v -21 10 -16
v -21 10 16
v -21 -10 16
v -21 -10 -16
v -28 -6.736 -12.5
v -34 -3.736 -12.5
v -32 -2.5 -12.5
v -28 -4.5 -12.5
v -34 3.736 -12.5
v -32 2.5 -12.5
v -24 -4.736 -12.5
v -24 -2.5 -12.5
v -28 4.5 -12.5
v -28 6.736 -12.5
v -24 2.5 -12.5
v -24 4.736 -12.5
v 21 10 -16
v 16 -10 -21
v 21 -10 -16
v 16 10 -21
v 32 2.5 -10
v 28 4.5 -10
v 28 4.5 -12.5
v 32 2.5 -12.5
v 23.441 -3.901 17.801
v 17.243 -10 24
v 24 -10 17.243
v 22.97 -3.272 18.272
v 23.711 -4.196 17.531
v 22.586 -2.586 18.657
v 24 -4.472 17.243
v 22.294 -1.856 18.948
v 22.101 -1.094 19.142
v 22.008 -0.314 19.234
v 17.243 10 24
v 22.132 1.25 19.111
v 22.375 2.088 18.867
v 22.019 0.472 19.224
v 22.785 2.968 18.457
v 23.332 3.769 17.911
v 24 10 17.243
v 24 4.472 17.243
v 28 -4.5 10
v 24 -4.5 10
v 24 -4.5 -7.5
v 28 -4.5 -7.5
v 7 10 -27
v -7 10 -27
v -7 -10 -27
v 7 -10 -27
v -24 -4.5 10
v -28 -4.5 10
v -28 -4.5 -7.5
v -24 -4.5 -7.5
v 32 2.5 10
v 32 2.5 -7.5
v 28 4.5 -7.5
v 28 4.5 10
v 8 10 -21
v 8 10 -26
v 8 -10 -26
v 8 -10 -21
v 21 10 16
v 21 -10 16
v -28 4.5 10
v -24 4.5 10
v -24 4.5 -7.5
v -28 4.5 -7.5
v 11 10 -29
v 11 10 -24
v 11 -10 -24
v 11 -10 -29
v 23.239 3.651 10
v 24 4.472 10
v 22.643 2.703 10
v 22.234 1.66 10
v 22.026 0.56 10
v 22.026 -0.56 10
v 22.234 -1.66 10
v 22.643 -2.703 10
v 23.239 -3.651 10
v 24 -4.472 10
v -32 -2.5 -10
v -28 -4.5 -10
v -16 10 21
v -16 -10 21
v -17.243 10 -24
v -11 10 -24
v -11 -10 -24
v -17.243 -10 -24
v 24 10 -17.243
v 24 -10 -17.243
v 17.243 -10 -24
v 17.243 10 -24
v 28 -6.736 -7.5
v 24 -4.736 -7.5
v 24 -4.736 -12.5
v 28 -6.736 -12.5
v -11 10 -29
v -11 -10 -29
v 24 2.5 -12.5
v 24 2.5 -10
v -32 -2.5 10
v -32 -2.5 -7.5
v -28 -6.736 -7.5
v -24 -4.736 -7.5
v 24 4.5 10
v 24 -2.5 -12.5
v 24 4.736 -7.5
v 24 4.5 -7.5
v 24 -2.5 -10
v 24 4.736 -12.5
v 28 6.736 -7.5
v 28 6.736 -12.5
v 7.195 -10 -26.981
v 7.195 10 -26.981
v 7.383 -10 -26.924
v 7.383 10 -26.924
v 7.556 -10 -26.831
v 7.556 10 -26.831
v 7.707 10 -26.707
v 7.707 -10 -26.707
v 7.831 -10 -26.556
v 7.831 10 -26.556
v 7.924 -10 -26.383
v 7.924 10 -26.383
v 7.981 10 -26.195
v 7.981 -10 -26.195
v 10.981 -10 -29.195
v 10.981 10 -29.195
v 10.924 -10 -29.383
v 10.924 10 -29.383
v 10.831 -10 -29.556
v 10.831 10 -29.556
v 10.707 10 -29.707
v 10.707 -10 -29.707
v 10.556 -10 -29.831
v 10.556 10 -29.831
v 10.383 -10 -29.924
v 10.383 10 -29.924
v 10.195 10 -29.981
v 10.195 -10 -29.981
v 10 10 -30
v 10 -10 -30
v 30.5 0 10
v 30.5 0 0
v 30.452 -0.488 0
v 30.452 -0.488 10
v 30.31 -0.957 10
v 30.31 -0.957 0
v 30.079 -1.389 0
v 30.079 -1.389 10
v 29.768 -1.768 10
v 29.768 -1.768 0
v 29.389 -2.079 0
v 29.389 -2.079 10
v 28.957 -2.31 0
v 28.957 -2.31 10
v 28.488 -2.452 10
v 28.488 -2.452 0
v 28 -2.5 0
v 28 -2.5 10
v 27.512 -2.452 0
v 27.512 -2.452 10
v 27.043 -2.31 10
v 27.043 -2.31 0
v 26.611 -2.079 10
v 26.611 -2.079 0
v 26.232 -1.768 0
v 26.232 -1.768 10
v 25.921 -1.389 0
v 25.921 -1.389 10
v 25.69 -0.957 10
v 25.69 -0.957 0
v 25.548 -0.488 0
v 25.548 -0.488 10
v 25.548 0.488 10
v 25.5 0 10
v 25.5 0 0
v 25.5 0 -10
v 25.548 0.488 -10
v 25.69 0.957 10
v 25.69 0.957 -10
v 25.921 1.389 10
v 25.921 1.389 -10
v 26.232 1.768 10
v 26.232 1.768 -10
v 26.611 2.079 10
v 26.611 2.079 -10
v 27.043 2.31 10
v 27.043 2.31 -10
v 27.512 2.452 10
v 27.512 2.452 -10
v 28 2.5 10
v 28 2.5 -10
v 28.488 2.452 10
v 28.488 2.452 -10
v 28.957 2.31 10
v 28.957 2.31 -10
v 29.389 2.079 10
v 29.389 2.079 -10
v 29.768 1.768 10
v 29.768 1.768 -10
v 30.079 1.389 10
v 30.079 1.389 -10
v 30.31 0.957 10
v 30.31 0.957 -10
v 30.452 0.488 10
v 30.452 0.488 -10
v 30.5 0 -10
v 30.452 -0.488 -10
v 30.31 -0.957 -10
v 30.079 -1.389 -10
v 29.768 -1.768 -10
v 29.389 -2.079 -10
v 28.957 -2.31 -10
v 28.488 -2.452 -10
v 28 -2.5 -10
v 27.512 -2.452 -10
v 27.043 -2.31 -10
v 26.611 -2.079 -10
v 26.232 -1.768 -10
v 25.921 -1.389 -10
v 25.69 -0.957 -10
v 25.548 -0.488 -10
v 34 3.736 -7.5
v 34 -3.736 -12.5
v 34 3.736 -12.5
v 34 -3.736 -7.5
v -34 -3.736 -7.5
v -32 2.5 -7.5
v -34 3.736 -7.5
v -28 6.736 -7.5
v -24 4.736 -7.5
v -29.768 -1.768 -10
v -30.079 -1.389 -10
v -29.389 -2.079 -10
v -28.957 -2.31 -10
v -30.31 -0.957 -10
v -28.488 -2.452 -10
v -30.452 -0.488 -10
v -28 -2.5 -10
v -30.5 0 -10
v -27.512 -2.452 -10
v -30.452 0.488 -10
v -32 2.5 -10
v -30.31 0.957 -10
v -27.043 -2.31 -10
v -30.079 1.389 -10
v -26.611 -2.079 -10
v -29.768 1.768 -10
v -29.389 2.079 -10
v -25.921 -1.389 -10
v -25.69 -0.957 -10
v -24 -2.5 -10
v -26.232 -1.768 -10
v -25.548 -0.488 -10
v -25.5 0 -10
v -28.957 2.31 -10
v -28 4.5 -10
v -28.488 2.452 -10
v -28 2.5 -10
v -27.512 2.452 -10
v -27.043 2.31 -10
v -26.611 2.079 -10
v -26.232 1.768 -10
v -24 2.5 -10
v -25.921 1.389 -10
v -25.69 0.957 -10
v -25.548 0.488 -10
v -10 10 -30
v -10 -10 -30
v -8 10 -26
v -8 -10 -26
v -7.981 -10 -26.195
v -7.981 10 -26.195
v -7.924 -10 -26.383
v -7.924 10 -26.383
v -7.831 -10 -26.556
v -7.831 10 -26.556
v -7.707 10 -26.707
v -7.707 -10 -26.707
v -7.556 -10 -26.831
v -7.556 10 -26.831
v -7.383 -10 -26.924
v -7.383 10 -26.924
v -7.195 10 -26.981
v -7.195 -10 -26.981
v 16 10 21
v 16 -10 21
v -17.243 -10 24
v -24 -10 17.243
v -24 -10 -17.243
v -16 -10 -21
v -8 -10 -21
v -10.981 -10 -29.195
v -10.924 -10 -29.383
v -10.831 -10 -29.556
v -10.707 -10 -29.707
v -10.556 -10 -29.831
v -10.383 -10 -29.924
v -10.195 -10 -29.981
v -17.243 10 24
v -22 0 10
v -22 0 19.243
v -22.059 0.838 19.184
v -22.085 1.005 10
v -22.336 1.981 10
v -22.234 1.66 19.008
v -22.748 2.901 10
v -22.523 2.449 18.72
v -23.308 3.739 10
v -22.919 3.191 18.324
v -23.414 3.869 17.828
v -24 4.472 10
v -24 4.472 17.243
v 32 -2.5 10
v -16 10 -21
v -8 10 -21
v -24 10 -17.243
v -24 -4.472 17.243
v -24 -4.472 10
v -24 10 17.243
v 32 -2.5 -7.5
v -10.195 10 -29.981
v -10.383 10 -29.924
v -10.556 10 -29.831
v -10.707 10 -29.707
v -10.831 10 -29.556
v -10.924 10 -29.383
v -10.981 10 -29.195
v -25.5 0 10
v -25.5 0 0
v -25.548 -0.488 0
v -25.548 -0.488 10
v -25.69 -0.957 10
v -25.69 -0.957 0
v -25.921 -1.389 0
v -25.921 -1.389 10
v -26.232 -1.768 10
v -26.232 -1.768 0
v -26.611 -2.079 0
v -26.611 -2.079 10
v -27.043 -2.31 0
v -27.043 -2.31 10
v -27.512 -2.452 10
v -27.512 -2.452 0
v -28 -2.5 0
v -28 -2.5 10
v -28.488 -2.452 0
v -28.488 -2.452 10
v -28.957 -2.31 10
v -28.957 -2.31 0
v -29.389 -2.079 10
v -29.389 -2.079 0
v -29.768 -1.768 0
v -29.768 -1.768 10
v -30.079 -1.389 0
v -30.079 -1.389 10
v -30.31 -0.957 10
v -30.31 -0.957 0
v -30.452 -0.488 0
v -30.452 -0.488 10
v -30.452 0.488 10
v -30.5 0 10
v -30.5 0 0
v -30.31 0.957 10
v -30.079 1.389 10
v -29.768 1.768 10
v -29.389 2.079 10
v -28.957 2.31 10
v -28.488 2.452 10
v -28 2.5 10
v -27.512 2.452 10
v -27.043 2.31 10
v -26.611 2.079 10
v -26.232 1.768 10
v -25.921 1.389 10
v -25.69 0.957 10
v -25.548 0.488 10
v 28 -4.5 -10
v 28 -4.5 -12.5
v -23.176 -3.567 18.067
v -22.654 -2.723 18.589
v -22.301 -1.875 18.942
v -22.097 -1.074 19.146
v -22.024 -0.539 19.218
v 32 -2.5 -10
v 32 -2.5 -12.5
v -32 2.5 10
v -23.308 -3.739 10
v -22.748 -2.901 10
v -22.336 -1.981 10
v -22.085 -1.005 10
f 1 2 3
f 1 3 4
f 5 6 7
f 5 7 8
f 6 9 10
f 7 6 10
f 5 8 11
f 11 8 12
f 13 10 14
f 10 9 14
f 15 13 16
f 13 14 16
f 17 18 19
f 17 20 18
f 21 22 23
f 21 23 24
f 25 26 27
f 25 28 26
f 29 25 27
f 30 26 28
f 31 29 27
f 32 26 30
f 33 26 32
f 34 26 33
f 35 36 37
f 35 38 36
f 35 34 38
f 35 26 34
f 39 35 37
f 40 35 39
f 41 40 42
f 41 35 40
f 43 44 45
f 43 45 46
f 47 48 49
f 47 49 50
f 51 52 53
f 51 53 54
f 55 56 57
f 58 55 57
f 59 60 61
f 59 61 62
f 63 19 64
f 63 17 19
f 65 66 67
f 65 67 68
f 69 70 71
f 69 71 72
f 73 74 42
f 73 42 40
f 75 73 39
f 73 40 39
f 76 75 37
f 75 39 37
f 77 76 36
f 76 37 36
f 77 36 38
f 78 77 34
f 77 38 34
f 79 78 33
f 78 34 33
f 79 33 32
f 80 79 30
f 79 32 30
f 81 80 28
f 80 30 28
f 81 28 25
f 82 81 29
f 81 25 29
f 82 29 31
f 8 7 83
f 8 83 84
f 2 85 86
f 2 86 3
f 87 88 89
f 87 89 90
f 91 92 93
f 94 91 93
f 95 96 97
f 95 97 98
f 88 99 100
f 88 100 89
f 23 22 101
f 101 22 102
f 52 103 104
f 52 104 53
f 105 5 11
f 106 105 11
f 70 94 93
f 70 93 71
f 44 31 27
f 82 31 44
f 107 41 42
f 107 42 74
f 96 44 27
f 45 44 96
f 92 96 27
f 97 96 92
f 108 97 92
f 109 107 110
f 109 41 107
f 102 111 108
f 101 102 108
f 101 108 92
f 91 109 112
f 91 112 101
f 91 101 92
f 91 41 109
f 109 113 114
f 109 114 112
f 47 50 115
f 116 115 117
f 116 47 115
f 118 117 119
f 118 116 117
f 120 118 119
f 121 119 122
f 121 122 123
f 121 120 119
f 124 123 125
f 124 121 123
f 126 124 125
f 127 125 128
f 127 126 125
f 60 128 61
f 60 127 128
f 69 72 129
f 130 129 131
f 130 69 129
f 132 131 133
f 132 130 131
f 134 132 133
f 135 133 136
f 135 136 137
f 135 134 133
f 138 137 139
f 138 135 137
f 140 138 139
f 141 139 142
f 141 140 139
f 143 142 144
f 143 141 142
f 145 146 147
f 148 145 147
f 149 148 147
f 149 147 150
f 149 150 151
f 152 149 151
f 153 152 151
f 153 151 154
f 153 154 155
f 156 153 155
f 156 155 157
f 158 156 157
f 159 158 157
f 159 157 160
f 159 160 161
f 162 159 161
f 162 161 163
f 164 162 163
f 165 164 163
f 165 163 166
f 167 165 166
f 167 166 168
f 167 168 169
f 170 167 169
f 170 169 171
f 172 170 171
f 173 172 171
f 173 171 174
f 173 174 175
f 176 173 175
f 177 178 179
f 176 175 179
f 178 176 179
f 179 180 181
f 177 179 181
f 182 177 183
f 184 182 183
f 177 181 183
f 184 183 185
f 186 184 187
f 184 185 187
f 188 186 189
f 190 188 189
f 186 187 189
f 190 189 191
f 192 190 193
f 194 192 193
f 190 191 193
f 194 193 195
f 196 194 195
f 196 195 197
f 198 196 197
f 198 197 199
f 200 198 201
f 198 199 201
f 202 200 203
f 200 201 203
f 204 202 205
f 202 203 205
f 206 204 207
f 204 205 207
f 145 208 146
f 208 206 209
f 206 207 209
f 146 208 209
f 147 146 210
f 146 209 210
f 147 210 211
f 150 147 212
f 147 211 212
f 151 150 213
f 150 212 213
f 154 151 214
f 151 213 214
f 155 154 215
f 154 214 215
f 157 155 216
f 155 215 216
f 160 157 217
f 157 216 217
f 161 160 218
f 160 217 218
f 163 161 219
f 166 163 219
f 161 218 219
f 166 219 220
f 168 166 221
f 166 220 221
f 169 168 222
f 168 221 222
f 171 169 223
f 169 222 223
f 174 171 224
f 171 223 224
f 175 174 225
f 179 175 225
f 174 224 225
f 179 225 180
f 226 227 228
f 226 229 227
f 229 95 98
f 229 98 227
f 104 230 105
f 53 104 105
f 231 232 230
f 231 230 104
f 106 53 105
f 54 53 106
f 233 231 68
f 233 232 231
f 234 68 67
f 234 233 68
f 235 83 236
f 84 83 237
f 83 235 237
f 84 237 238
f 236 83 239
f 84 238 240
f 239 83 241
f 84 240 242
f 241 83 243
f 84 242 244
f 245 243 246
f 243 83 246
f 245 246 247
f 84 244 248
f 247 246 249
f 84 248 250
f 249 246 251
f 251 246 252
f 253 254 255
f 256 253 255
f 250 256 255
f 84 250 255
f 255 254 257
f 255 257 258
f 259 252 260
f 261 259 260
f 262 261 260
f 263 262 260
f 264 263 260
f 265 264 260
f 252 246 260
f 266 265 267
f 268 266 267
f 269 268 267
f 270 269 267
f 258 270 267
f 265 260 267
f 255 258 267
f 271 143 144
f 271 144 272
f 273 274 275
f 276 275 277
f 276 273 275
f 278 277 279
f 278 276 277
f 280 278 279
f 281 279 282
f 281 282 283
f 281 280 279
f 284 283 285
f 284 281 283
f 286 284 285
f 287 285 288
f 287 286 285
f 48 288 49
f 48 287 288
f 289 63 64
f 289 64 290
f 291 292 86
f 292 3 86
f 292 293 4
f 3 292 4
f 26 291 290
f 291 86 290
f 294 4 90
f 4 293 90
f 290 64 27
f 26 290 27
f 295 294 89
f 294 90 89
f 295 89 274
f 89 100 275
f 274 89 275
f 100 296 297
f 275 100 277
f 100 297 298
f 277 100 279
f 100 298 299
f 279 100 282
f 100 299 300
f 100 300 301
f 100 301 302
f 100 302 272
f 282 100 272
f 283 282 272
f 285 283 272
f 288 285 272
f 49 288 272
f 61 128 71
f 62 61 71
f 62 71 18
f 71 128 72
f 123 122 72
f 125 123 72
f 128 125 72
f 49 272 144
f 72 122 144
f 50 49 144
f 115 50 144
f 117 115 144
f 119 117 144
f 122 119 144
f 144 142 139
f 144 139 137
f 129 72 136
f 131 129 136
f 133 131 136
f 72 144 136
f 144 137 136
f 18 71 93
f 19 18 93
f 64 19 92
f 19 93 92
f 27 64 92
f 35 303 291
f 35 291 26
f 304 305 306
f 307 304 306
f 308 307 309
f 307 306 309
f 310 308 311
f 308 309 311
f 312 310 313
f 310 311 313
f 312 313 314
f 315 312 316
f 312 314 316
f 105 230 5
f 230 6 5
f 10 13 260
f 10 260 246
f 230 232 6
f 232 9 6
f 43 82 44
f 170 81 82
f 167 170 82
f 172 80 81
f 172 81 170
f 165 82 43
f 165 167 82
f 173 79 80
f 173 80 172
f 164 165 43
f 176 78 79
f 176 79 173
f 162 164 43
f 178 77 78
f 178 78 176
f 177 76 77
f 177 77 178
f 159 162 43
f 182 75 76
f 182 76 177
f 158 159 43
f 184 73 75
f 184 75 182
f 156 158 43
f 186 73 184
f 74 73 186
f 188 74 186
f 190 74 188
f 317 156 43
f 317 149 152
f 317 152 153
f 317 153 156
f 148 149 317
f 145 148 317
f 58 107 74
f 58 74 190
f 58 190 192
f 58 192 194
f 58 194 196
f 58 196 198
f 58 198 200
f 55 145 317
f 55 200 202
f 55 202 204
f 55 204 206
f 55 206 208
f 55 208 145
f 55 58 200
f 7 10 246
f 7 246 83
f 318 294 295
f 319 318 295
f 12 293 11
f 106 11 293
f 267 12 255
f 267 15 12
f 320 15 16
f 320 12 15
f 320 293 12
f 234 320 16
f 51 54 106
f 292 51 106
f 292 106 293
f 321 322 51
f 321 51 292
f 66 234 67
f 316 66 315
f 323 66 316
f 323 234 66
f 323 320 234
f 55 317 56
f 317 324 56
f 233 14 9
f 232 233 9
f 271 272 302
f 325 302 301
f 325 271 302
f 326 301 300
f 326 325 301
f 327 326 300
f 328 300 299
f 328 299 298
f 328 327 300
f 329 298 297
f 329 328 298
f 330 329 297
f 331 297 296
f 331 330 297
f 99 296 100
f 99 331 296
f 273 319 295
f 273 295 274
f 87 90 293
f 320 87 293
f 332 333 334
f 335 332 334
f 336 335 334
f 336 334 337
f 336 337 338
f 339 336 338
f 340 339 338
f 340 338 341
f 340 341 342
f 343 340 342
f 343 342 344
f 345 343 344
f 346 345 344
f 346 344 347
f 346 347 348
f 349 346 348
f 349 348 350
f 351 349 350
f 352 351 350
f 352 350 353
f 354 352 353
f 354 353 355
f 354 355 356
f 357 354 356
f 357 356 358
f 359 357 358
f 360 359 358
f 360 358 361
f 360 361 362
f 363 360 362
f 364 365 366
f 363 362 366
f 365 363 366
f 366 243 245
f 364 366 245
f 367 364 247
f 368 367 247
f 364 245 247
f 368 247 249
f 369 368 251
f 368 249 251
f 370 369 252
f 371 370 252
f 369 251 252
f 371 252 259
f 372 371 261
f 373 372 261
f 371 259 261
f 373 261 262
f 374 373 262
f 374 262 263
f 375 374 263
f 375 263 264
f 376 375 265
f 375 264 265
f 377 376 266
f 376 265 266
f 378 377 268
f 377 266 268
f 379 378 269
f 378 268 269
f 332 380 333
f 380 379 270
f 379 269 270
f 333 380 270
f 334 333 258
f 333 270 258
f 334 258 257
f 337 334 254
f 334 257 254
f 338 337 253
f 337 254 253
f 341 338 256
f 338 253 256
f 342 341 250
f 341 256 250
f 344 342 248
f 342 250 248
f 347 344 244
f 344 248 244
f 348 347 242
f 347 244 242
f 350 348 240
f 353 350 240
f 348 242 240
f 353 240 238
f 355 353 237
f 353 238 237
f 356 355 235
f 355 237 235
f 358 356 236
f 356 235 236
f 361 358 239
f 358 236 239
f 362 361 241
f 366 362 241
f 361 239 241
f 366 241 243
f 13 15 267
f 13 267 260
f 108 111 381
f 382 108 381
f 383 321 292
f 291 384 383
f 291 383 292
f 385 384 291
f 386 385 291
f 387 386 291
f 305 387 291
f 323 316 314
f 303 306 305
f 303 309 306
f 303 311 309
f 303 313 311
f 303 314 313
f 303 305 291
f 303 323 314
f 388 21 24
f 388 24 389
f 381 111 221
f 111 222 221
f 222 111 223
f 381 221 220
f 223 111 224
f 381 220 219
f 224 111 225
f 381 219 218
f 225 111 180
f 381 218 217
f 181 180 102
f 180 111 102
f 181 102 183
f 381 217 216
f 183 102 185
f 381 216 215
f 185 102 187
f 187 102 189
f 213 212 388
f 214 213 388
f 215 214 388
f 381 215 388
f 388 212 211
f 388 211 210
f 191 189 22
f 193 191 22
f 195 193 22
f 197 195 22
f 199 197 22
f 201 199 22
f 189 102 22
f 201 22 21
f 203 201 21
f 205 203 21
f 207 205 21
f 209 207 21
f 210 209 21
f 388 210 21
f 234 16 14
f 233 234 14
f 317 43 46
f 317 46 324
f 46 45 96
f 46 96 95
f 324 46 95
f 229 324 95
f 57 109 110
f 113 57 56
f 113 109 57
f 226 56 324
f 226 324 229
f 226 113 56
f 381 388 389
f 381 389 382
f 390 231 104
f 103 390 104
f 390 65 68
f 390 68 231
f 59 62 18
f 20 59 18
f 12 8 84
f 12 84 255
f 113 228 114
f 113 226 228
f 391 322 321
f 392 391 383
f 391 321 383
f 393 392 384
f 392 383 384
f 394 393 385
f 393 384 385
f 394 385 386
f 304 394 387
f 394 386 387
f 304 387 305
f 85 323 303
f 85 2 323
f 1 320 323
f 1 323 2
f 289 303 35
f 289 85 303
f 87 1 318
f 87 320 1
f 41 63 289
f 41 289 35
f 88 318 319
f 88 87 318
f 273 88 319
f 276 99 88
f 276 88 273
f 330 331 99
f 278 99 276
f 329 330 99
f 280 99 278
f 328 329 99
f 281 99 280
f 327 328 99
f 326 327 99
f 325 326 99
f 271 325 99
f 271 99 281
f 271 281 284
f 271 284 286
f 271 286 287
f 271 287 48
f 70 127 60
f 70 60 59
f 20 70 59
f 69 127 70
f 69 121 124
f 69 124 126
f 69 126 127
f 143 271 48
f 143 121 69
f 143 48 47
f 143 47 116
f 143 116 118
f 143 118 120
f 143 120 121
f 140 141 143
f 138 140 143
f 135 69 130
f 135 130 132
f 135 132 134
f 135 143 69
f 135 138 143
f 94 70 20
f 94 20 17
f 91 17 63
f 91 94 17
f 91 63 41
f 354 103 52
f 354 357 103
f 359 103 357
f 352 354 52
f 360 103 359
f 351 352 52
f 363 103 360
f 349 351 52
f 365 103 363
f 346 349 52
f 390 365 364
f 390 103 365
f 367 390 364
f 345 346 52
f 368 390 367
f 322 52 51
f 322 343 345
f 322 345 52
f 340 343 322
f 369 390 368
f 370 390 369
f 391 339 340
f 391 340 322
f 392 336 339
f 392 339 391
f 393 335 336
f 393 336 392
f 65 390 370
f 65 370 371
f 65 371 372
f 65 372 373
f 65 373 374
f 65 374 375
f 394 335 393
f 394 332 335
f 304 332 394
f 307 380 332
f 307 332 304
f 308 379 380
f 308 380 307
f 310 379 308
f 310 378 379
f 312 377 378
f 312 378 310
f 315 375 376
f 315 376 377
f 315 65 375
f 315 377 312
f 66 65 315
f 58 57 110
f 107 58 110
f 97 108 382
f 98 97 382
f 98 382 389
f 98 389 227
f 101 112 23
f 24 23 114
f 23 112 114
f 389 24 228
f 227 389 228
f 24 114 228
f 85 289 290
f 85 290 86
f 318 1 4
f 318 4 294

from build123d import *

# Parameters (mm, degrees)
RESSALTO_EXTRUS_O1_DEPTH = 10
RESSALTO_EXTRUS_O2_DEPTH = 10
CORTE_EXTRUS_O1_START    = 21
ESBO_O4_R                = 6
ESBO_O4_R_2              = 2.5
CORTE_EXTRUS_O1_DEPTH    = 21
RESSALTO_EXTRUS_O3_DEPTH = 2.5


with BuildPart() as part:
    # Esboço1 → Ressalto-extrusão1 (new, symmetric)
    with BuildSketch(Plane(origin=(0, 0, 0), x_dir=(1, 0, 0), z_dir=(0, 1, 0))):
        with BuildLine():
            Line((21, 16), (21, 0))
            Line((21, 0), (24, 0))
            Line((24, 0), (24, 17.242640687))
            Line((24, 17.242640687), (17.242640687, 24))
            Line((17.242640687, 24), (11, 24))
            Line((11, 24), (11, 29))
            ThreePointArc((11, 29), (10.707106781, 29.707106781), (10, 30))
            Line((10, 30), (0, 30))
            Line((0, 30), (-10, 30))
            ThreePointArc((-10, 30), (-10.707106781, 29.707106781), (-11, 29))
            Line((-11, 29), (-11, 24))
            Line((-11, 24), (-17.242640687, 24))
            Line((-17.242640687, 24), (-24, 17.242640687))
            Line((-24, 17.242640687), (-24, 0))
            Line((-24, 0), (-21, 0))
            Line((-21, 0), (-21, 16))
            Line((-21, 16), (-16, 21))
            Line((-16, 21), (-8, 21))
            Line((-8, 21), (-8, 26))
            ThreePointArc((-8, 26), (-7.707106781, 26.707106781), (-7, 27))
            Line((-7, 27), (0, 27))
            Line((0, 27), (7, 27))
            ThreePointArc((7, 27), (7.707106781, 26.707106781), (8, 26))
            Line((8, 26), (8, 21))
            Line((8, 21), (16, 21))
            Line((16, 21), (21, 16))
        make_face()
        Polygon((0, -21), (0, -24), (17.242640687, -24), (24, -17.242640687), (24, 0), (21, 0), (21, -16), (16, -21), align=None)
        Polygon((-17.242640687, -24), (0, -24), (0, -21), (-16, -21), (-21, -16), (-21, 0), (-24, 0), (-24, -17.242640687), align=None)
    extrude(amount=RESSALTO_EXTRUS_O1_DEPTH, both=True)

    # Esboço2 → Ressalto-extrusão2 (add, symmetric)
    with BuildSketch(Plane.XY):
        with BuildLine():
            Line((-24, 0), (-24, 4.5))
            Line((-24, 4.5), (-28, 4.5))
            Line((-28, 4.5), (-28, 2.5))
            ThreePointArc((-28, 2.5), (-26.232233047, 1.767766953), (-25.5, 0))
            Line((-25.5, 0), (-24, 0))
        make_face()
        with BuildLine():
            Line((-28, 2.5), (-28, 4.5))
            Line((-28, 4.5), (-32, 2.5))
            Line((-32, 2.5), (-32, 0))
            Line((-32, 0), (-30.5, 0))
            ThreePointArc((-30.5, 0), (-29.767766953, 1.767766953), (-28, 2.5))
        make_face()
        with BuildLine():
            Line((-24, -4.5), (-24, 0))
            Line((-24, 0), (-25.5, 0))
            ThreePointArc((-25.5, 0), (-28, -2.5), (-30.5, 0))
            Line((-30.5, 0), (-32, 0))
            Line((-32, 0), (-32, -2.5))
            Line((-32, -2.5), (-28, -4.5))
            Line((-28, -4.5), (-24, -4.5))
        make_face()
        with BuildLine():
            Line((32, 0), (30.5, 0))
            ThreePointArc((30.5, 0), (28, -2.5), (25.5, 0))
            Line((25.5, 0), (24, 0))
            Line((24, 0), (24, -4.5))
            Line((24, -4.5), (28, -4.5))
            Line((28, -4.5), (32, -2.5))
            Line((32, -2.5), (32, 0))
        make_face()
        with BuildLine():
            Line((24, 0), (25.5, 0))
            ThreePointArc((25.5, 0), (26.232233047, 1.767766953), (28, 2.5))
            Line((28, 2.5), (28, 4.5))
            Line((28, 4.5), (24, 4.5))
            Line((24, 4.5), (24, 0))
        make_face()
        with BuildLine():
            ThreePointArc((28, 2.5), (29.767766953, 1.767766953), (30.5, 0))
            Line((30.5, 0), (32, 0))
            Line((32, 0), (32, 2.5))
            Line((32, 2.5), (28, 4.5))
            Line((28, 4.5), (28, 2.5))
        make_face()
    extrude(amount=RESSALTO_EXTRUS_O2_DEPTH, both=True)

    # Esboço4 → Corte-extrusão1 (cut)
    # profile 1 of 3: a face of its own
    with BuildSketch(Plane.XY.offset(10).offset(CORTE_EXTRUS_O1_START)):
        with BuildLine():
            Line((-24, 4.472135955), (-24, -4.472135955))
            ThreePointArc((-24, -4.472135955), (-22.522774425, -2.449489743), (-22, 0))
            ThreePointArc((-22, 0), (-22.522774425, 2.449489743), (-24, 4.472135955))
        make_face()
    # profile 2 of 3: a face of its own
    with BuildSketch(Plane.XY.offset(10).offset(CORTE_EXTRUS_O1_START)):
        with Locations((28, 0)):
            Circle(ESBO_O4_R)
        with Locations((28, 0)):
            Circle(ESBO_O4_R_2, mode=Mode.SUBTRACT)
    # profile 3 of 3: a face of its own
    with BuildSketch(Plane.XY.offset(10).offset(CORTE_EXTRUS_O1_START)):
        with Locations((28, 0)):
            Circle(ESBO_O4_R_2)
    extrude(amount=-CORTE_EXTRUS_O1_DEPTH, mode=Mode.SUBTRACT)

    # Esboço5 → Ressalto-extrusão3 (add, symmetric)
    # profile 1 of 4: a face of its own
    with BuildSketch(Plane(origin=(0, 0, -10), x_dir=(-1, 0, 0), z_dir=(0, 0, -1))):
        Polygon((-28, 6.736067977), (-22, 3.736067977), (-22, -3.736067977), (-28, -6.736067977), (-34, -3.736067977), (-34, 3.736067977), align=None)
        Polygon((-28, 4.5), (-32, 2.5), (-32, -2.5), (-28, -4.5), (-24, -4.5), (-24, 4.5), align=None, mode=Mode.SUBTRACT)
    # profile 2 of 4: a face of its own
    with BuildSketch(Plane(origin=(0, 0, -10), x_dir=(-1, 0, 0), z_dir=(0, 0, -1))):
        Polygon((-24, 4.5), (-28, 4.5), (-24, 2.5), align=None)
    # profile 3 of 4: a face of its own
    with BuildSketch(Plane(origin=(0, 0, -10), x_dir=(-1, 0, 0), z_dir=(0, 0, -1))):
        Polygon((-24, -2.5), (-28, -4.5), (-24, -4.5), align=None)
    # profile 4 of 4: a face of its own
    with BuildSketch(Plane(origin=(0, 0, -10), x_dir=(-1, 0, 0), z_dir=(0, 0, -1))):
        Polygon((28, 6.736067977), (34, 3.736067977), (34, -3.736067977), (28, -6.736067977), (22, -3.736067977), (22, 3.736067977), align=None)
        Polygon((28, 4.5), (32, 2.5), (32, -2.5), (28, -4.5), (24, -2.5), (24, 2.5), align=None, mode=Mode.SUBTRACT)
    extrude(amount=RESSALTO_EXTRUS_O3_DEPTH, both=True)


solid = part.part
